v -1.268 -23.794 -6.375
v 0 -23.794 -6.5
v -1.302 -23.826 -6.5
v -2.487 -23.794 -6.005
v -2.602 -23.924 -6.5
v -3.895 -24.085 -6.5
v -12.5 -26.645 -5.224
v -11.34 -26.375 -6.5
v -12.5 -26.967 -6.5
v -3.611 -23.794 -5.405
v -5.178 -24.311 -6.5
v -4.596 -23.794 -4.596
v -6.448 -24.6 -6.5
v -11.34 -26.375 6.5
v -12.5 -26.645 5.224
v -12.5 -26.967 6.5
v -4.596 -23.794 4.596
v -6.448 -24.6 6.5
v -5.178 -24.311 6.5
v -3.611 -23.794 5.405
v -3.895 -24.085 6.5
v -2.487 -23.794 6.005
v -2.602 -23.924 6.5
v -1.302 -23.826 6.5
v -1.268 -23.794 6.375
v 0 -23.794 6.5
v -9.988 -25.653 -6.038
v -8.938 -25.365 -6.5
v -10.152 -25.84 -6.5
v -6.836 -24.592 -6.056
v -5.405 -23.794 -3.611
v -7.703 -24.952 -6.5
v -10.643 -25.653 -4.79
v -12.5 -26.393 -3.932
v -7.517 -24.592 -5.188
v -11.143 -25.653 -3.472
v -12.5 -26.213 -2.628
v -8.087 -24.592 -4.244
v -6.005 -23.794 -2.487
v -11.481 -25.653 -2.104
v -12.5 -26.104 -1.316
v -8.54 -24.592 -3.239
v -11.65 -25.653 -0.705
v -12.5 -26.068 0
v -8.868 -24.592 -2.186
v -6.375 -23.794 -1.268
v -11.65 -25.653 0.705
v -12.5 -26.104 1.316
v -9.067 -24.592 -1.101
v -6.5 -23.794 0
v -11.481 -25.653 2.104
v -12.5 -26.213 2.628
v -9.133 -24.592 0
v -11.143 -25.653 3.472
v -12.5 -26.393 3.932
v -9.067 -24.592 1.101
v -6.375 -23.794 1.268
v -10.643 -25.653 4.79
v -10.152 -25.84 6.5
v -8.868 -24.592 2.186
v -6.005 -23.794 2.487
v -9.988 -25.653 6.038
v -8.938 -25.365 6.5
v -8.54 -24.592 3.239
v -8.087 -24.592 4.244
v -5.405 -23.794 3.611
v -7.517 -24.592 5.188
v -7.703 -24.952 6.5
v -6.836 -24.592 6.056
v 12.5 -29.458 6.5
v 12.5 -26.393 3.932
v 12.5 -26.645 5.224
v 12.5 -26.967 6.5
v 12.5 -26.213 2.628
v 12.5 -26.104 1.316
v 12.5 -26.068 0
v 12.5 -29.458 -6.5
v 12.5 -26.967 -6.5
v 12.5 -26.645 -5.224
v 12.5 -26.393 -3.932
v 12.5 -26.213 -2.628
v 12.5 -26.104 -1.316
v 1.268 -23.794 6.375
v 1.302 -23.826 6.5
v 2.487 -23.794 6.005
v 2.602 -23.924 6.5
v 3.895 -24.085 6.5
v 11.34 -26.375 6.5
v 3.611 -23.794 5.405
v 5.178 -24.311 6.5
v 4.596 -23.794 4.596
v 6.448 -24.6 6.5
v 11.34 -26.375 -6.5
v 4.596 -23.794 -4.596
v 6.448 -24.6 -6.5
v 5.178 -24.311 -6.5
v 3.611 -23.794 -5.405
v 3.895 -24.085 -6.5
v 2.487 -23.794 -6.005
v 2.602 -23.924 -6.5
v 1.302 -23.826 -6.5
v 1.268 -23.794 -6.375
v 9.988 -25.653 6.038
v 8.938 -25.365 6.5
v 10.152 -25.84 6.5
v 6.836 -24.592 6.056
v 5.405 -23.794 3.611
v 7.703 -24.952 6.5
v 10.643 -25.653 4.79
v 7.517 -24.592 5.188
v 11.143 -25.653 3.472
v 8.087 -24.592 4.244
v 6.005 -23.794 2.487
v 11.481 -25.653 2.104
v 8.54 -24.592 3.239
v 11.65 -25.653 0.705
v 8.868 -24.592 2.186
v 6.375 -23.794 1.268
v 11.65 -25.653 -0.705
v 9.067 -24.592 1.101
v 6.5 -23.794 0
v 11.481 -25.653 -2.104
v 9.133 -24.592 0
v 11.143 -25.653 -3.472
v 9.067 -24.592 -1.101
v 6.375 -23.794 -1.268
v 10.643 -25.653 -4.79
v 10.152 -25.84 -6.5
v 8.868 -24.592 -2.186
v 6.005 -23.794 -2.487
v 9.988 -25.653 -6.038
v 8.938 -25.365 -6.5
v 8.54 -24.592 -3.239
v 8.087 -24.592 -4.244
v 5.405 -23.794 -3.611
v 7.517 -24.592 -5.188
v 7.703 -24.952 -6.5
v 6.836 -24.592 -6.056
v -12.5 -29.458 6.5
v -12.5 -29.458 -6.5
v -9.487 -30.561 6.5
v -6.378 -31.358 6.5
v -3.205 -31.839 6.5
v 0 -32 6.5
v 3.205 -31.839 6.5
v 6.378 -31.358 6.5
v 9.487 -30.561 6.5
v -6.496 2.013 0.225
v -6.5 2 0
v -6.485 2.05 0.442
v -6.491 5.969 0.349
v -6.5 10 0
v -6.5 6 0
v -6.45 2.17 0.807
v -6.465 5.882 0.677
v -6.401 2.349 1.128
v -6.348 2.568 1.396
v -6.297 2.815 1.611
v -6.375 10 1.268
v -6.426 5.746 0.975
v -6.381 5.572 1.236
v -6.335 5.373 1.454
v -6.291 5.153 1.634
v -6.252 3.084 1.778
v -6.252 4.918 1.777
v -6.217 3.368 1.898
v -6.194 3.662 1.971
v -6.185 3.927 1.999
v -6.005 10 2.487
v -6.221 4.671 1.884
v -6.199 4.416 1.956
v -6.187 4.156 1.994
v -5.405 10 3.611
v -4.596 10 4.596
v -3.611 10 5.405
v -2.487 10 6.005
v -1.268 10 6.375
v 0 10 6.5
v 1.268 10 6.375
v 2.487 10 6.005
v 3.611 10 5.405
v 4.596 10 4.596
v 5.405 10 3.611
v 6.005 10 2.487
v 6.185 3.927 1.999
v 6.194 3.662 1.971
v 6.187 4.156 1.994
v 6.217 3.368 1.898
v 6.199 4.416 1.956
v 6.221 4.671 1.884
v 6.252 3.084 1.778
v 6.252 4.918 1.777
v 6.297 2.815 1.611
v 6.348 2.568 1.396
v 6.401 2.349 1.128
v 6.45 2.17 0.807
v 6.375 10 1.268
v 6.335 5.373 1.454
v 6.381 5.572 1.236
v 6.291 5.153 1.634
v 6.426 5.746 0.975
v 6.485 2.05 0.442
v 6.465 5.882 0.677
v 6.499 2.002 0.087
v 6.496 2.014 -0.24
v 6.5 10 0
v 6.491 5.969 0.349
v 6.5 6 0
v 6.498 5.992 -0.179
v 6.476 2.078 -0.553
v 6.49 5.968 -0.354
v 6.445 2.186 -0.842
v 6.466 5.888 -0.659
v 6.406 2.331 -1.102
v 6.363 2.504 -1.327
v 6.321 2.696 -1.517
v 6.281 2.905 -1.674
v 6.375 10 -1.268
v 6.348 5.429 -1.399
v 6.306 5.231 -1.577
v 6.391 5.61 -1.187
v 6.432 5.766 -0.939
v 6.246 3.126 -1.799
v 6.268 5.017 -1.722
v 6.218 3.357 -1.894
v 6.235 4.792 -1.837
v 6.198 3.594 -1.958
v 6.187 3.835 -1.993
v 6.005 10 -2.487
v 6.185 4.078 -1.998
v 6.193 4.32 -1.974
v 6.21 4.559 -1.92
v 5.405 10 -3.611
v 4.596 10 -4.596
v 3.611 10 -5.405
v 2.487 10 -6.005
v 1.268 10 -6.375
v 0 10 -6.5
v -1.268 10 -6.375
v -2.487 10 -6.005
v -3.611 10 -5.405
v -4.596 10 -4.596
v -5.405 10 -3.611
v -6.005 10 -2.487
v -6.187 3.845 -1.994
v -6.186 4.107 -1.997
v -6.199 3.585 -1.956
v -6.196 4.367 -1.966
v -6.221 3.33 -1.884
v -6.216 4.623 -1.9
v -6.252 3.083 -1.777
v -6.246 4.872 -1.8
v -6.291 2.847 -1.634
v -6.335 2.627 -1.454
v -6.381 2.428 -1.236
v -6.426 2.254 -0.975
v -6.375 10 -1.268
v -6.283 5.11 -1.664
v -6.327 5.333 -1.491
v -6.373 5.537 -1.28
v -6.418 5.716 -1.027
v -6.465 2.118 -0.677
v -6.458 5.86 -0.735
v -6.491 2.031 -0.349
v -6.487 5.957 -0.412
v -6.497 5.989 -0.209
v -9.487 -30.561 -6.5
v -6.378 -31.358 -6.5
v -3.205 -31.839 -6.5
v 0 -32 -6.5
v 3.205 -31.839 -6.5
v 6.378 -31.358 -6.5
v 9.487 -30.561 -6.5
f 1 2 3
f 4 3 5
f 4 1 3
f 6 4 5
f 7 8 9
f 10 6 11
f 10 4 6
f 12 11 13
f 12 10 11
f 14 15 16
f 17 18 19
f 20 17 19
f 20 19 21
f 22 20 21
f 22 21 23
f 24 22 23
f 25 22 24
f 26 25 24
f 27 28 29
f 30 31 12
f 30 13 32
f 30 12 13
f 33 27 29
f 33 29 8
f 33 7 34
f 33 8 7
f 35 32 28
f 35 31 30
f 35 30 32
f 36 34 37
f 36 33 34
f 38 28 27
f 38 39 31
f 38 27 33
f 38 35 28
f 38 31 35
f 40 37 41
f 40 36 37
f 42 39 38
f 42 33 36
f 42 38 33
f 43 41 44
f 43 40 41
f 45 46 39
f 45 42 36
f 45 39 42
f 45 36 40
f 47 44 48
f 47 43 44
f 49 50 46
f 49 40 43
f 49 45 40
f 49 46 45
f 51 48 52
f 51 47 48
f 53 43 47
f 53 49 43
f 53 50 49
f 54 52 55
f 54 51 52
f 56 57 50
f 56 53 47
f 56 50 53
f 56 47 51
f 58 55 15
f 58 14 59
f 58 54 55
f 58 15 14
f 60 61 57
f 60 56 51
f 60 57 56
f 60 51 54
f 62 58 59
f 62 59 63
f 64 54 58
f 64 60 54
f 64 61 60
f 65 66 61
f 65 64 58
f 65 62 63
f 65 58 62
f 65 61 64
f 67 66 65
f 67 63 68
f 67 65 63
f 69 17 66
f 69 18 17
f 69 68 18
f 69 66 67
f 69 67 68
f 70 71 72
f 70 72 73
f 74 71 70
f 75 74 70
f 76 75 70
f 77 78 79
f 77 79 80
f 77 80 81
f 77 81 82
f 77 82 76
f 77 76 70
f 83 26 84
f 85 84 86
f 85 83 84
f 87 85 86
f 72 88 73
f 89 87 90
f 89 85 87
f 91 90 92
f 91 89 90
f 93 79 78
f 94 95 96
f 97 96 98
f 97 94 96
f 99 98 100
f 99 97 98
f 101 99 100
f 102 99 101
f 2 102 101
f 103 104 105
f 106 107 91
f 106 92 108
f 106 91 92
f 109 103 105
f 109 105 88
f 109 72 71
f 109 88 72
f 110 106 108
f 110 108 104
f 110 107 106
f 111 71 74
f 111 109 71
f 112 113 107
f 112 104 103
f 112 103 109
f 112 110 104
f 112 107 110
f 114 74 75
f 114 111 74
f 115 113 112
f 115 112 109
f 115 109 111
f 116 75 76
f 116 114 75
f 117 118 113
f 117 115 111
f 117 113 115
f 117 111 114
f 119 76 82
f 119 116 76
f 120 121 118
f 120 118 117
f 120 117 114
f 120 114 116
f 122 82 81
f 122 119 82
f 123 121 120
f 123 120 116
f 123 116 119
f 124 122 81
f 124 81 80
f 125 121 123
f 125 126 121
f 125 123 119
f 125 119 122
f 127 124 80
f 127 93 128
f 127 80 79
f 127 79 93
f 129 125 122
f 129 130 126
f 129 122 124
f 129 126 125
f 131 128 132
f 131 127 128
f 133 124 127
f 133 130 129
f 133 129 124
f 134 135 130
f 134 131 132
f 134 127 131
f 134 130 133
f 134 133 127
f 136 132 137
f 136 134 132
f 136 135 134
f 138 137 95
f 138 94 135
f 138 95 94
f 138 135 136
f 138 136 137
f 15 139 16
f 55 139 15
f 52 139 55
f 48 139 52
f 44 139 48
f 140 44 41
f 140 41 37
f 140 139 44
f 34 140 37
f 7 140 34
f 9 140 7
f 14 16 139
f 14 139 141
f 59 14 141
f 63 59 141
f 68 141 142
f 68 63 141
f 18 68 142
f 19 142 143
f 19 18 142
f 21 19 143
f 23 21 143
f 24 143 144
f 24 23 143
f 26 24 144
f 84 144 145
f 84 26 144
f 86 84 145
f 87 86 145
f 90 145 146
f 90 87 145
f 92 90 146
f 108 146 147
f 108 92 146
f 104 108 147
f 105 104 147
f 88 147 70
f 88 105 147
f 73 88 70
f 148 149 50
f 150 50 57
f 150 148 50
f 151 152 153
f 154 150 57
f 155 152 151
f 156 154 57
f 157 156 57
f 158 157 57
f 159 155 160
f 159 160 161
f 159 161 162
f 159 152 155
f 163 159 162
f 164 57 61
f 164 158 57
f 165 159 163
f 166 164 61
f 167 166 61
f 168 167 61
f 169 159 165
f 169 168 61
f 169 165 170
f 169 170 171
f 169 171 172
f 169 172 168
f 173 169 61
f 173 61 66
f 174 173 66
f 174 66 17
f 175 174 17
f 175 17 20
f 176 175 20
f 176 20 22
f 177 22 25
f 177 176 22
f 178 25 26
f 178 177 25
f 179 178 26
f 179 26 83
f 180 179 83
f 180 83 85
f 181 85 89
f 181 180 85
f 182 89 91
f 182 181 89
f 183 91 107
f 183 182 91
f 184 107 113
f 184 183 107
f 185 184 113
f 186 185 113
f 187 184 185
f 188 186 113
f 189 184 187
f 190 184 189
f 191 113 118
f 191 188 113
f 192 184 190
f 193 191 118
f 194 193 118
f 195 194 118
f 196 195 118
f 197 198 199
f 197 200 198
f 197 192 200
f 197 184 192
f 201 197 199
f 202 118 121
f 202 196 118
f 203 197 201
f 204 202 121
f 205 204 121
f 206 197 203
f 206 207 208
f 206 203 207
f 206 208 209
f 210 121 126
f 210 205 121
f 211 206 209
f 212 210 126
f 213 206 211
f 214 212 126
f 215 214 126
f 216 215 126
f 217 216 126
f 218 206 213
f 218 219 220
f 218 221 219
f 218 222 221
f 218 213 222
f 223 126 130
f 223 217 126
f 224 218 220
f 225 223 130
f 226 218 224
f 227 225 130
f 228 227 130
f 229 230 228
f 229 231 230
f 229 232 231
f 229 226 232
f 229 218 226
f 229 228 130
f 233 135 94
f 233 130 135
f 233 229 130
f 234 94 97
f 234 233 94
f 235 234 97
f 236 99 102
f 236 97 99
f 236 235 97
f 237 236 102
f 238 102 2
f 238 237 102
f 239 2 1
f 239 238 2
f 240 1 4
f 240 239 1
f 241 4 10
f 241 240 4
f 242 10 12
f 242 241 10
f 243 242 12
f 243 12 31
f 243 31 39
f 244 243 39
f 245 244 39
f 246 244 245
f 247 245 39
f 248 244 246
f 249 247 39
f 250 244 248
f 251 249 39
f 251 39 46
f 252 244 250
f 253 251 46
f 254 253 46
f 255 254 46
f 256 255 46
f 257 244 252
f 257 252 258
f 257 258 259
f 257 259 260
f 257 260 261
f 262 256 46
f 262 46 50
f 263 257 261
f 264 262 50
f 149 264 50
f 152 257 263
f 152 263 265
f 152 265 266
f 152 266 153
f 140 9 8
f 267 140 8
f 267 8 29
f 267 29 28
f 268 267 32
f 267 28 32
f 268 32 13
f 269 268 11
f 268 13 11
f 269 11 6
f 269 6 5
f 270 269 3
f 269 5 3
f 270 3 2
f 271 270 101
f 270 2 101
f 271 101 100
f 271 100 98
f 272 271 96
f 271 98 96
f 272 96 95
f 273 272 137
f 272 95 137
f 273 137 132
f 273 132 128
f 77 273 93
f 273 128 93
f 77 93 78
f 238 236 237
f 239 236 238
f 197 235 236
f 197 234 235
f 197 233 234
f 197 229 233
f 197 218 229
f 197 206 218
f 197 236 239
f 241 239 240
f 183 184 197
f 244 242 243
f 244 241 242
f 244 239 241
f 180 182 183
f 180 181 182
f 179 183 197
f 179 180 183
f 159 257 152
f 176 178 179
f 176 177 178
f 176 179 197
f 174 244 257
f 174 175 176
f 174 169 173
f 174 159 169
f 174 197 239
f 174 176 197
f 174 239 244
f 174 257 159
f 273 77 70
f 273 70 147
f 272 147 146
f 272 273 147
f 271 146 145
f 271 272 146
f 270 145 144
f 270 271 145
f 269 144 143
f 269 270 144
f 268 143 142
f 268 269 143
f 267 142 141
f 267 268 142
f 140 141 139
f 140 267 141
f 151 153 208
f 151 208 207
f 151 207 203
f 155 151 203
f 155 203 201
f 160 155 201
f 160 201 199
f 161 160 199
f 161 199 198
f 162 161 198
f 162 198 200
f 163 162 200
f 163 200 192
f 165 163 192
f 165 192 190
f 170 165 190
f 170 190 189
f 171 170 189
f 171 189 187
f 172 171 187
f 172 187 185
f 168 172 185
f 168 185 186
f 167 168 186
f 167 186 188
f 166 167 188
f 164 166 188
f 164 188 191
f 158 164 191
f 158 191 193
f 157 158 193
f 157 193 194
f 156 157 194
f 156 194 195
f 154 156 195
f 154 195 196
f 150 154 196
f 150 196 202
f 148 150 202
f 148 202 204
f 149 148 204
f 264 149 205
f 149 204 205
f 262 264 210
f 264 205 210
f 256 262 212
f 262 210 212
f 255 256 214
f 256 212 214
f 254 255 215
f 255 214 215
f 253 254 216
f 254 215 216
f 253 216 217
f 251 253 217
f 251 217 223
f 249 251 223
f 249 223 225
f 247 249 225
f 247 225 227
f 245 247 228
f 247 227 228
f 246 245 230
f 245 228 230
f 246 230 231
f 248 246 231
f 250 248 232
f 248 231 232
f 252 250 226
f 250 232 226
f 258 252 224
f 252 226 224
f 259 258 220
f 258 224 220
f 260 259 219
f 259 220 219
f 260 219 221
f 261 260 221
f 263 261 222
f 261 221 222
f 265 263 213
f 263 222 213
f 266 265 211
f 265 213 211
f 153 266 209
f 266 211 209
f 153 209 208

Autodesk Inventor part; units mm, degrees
ref_plane "YZ Plane" through (0, 0, 0) normal (1, 0, 0) x (0, 1, 0)
sketch "Sketch1" plane through (0, 0, 0) normal (0, 0, 1) x (1, 0, 0)
  line L0 (-16.45, 0) -> (38.85, 0) projected
  line L1 (0, -84.7) -> (0, 23.1) projected
  line L2 (-12.5, -29.4576) -> (-12.5, -21.4576)
  line L3 (-12.5, -21.4576) -> (12.5, -21.4576)
  line L4 (12.5, -21.4576) -> (12.5, -29.4576)
  arc A0 (-12.5, -29.4576) -> (12.5, -29.4576) centre (0, 0) ccw
  arc A1 (0, -77) -> (0, -23) centre (0, -50) ccw
  line L5 (0, -77) -> (0, -23)
  dimension "d0" = 32
  dimension "d1" = 8
  dimension "d2" = 25
  dimension "d5" = 27
  dimension "d6" = 50
extrude "Extrusion1" add sketch "Sketch1" along normal mid plane 13 contours A0 L2 L3 L1 | L1 A1 L4 A0 | A1 L1 L3 L4 picked at (1.4378, -26.1156)
revolve "Revolution1" cut sketch "Sketch1" angle 360 about axis through (0, -10, 0) along (0, 1, 0) keep common part contours L1 A0 L4 A1 | L1 A1 L4 A0
ref_plane "Work Plane1" through (0, -32, 0) normal (0, 1, 0) x (-1, 0, 0)
ref_plane "Work Plane2" through (0, 10, 0) normal (0, 1, 0) x (-1, 0, 0)
sketch "Sketch2" plane through (0, 10, 0) normal (0, 1, 0) x (-1, 0, 0)
  circle A0 centre (0, 0) radius 6.5
  line L0 (-12.5, 6.5) -> (12.5, 6.5) projected
extrude "Extrusion2" add sketch "Sketch2" against normal up to next
sketch "Sketch3" plane through (0, 0, 0) normal (1, 0, 0) x (0, 1, 0)
  line L0 (1.2, 0) -> (12.4, 0) projected
  circle A0 centre (4, 0) radius 2
  line L1 (10, 6.5) -> (10, -6.5) projected
  dimension "d11" = 4
  dimension "d12" = 6
extrude "Extrusion3" cut sketch "Sketch3" along normal through all both and the other way through all
properties part number "Stem" material "Bronze, Soft Tin"
